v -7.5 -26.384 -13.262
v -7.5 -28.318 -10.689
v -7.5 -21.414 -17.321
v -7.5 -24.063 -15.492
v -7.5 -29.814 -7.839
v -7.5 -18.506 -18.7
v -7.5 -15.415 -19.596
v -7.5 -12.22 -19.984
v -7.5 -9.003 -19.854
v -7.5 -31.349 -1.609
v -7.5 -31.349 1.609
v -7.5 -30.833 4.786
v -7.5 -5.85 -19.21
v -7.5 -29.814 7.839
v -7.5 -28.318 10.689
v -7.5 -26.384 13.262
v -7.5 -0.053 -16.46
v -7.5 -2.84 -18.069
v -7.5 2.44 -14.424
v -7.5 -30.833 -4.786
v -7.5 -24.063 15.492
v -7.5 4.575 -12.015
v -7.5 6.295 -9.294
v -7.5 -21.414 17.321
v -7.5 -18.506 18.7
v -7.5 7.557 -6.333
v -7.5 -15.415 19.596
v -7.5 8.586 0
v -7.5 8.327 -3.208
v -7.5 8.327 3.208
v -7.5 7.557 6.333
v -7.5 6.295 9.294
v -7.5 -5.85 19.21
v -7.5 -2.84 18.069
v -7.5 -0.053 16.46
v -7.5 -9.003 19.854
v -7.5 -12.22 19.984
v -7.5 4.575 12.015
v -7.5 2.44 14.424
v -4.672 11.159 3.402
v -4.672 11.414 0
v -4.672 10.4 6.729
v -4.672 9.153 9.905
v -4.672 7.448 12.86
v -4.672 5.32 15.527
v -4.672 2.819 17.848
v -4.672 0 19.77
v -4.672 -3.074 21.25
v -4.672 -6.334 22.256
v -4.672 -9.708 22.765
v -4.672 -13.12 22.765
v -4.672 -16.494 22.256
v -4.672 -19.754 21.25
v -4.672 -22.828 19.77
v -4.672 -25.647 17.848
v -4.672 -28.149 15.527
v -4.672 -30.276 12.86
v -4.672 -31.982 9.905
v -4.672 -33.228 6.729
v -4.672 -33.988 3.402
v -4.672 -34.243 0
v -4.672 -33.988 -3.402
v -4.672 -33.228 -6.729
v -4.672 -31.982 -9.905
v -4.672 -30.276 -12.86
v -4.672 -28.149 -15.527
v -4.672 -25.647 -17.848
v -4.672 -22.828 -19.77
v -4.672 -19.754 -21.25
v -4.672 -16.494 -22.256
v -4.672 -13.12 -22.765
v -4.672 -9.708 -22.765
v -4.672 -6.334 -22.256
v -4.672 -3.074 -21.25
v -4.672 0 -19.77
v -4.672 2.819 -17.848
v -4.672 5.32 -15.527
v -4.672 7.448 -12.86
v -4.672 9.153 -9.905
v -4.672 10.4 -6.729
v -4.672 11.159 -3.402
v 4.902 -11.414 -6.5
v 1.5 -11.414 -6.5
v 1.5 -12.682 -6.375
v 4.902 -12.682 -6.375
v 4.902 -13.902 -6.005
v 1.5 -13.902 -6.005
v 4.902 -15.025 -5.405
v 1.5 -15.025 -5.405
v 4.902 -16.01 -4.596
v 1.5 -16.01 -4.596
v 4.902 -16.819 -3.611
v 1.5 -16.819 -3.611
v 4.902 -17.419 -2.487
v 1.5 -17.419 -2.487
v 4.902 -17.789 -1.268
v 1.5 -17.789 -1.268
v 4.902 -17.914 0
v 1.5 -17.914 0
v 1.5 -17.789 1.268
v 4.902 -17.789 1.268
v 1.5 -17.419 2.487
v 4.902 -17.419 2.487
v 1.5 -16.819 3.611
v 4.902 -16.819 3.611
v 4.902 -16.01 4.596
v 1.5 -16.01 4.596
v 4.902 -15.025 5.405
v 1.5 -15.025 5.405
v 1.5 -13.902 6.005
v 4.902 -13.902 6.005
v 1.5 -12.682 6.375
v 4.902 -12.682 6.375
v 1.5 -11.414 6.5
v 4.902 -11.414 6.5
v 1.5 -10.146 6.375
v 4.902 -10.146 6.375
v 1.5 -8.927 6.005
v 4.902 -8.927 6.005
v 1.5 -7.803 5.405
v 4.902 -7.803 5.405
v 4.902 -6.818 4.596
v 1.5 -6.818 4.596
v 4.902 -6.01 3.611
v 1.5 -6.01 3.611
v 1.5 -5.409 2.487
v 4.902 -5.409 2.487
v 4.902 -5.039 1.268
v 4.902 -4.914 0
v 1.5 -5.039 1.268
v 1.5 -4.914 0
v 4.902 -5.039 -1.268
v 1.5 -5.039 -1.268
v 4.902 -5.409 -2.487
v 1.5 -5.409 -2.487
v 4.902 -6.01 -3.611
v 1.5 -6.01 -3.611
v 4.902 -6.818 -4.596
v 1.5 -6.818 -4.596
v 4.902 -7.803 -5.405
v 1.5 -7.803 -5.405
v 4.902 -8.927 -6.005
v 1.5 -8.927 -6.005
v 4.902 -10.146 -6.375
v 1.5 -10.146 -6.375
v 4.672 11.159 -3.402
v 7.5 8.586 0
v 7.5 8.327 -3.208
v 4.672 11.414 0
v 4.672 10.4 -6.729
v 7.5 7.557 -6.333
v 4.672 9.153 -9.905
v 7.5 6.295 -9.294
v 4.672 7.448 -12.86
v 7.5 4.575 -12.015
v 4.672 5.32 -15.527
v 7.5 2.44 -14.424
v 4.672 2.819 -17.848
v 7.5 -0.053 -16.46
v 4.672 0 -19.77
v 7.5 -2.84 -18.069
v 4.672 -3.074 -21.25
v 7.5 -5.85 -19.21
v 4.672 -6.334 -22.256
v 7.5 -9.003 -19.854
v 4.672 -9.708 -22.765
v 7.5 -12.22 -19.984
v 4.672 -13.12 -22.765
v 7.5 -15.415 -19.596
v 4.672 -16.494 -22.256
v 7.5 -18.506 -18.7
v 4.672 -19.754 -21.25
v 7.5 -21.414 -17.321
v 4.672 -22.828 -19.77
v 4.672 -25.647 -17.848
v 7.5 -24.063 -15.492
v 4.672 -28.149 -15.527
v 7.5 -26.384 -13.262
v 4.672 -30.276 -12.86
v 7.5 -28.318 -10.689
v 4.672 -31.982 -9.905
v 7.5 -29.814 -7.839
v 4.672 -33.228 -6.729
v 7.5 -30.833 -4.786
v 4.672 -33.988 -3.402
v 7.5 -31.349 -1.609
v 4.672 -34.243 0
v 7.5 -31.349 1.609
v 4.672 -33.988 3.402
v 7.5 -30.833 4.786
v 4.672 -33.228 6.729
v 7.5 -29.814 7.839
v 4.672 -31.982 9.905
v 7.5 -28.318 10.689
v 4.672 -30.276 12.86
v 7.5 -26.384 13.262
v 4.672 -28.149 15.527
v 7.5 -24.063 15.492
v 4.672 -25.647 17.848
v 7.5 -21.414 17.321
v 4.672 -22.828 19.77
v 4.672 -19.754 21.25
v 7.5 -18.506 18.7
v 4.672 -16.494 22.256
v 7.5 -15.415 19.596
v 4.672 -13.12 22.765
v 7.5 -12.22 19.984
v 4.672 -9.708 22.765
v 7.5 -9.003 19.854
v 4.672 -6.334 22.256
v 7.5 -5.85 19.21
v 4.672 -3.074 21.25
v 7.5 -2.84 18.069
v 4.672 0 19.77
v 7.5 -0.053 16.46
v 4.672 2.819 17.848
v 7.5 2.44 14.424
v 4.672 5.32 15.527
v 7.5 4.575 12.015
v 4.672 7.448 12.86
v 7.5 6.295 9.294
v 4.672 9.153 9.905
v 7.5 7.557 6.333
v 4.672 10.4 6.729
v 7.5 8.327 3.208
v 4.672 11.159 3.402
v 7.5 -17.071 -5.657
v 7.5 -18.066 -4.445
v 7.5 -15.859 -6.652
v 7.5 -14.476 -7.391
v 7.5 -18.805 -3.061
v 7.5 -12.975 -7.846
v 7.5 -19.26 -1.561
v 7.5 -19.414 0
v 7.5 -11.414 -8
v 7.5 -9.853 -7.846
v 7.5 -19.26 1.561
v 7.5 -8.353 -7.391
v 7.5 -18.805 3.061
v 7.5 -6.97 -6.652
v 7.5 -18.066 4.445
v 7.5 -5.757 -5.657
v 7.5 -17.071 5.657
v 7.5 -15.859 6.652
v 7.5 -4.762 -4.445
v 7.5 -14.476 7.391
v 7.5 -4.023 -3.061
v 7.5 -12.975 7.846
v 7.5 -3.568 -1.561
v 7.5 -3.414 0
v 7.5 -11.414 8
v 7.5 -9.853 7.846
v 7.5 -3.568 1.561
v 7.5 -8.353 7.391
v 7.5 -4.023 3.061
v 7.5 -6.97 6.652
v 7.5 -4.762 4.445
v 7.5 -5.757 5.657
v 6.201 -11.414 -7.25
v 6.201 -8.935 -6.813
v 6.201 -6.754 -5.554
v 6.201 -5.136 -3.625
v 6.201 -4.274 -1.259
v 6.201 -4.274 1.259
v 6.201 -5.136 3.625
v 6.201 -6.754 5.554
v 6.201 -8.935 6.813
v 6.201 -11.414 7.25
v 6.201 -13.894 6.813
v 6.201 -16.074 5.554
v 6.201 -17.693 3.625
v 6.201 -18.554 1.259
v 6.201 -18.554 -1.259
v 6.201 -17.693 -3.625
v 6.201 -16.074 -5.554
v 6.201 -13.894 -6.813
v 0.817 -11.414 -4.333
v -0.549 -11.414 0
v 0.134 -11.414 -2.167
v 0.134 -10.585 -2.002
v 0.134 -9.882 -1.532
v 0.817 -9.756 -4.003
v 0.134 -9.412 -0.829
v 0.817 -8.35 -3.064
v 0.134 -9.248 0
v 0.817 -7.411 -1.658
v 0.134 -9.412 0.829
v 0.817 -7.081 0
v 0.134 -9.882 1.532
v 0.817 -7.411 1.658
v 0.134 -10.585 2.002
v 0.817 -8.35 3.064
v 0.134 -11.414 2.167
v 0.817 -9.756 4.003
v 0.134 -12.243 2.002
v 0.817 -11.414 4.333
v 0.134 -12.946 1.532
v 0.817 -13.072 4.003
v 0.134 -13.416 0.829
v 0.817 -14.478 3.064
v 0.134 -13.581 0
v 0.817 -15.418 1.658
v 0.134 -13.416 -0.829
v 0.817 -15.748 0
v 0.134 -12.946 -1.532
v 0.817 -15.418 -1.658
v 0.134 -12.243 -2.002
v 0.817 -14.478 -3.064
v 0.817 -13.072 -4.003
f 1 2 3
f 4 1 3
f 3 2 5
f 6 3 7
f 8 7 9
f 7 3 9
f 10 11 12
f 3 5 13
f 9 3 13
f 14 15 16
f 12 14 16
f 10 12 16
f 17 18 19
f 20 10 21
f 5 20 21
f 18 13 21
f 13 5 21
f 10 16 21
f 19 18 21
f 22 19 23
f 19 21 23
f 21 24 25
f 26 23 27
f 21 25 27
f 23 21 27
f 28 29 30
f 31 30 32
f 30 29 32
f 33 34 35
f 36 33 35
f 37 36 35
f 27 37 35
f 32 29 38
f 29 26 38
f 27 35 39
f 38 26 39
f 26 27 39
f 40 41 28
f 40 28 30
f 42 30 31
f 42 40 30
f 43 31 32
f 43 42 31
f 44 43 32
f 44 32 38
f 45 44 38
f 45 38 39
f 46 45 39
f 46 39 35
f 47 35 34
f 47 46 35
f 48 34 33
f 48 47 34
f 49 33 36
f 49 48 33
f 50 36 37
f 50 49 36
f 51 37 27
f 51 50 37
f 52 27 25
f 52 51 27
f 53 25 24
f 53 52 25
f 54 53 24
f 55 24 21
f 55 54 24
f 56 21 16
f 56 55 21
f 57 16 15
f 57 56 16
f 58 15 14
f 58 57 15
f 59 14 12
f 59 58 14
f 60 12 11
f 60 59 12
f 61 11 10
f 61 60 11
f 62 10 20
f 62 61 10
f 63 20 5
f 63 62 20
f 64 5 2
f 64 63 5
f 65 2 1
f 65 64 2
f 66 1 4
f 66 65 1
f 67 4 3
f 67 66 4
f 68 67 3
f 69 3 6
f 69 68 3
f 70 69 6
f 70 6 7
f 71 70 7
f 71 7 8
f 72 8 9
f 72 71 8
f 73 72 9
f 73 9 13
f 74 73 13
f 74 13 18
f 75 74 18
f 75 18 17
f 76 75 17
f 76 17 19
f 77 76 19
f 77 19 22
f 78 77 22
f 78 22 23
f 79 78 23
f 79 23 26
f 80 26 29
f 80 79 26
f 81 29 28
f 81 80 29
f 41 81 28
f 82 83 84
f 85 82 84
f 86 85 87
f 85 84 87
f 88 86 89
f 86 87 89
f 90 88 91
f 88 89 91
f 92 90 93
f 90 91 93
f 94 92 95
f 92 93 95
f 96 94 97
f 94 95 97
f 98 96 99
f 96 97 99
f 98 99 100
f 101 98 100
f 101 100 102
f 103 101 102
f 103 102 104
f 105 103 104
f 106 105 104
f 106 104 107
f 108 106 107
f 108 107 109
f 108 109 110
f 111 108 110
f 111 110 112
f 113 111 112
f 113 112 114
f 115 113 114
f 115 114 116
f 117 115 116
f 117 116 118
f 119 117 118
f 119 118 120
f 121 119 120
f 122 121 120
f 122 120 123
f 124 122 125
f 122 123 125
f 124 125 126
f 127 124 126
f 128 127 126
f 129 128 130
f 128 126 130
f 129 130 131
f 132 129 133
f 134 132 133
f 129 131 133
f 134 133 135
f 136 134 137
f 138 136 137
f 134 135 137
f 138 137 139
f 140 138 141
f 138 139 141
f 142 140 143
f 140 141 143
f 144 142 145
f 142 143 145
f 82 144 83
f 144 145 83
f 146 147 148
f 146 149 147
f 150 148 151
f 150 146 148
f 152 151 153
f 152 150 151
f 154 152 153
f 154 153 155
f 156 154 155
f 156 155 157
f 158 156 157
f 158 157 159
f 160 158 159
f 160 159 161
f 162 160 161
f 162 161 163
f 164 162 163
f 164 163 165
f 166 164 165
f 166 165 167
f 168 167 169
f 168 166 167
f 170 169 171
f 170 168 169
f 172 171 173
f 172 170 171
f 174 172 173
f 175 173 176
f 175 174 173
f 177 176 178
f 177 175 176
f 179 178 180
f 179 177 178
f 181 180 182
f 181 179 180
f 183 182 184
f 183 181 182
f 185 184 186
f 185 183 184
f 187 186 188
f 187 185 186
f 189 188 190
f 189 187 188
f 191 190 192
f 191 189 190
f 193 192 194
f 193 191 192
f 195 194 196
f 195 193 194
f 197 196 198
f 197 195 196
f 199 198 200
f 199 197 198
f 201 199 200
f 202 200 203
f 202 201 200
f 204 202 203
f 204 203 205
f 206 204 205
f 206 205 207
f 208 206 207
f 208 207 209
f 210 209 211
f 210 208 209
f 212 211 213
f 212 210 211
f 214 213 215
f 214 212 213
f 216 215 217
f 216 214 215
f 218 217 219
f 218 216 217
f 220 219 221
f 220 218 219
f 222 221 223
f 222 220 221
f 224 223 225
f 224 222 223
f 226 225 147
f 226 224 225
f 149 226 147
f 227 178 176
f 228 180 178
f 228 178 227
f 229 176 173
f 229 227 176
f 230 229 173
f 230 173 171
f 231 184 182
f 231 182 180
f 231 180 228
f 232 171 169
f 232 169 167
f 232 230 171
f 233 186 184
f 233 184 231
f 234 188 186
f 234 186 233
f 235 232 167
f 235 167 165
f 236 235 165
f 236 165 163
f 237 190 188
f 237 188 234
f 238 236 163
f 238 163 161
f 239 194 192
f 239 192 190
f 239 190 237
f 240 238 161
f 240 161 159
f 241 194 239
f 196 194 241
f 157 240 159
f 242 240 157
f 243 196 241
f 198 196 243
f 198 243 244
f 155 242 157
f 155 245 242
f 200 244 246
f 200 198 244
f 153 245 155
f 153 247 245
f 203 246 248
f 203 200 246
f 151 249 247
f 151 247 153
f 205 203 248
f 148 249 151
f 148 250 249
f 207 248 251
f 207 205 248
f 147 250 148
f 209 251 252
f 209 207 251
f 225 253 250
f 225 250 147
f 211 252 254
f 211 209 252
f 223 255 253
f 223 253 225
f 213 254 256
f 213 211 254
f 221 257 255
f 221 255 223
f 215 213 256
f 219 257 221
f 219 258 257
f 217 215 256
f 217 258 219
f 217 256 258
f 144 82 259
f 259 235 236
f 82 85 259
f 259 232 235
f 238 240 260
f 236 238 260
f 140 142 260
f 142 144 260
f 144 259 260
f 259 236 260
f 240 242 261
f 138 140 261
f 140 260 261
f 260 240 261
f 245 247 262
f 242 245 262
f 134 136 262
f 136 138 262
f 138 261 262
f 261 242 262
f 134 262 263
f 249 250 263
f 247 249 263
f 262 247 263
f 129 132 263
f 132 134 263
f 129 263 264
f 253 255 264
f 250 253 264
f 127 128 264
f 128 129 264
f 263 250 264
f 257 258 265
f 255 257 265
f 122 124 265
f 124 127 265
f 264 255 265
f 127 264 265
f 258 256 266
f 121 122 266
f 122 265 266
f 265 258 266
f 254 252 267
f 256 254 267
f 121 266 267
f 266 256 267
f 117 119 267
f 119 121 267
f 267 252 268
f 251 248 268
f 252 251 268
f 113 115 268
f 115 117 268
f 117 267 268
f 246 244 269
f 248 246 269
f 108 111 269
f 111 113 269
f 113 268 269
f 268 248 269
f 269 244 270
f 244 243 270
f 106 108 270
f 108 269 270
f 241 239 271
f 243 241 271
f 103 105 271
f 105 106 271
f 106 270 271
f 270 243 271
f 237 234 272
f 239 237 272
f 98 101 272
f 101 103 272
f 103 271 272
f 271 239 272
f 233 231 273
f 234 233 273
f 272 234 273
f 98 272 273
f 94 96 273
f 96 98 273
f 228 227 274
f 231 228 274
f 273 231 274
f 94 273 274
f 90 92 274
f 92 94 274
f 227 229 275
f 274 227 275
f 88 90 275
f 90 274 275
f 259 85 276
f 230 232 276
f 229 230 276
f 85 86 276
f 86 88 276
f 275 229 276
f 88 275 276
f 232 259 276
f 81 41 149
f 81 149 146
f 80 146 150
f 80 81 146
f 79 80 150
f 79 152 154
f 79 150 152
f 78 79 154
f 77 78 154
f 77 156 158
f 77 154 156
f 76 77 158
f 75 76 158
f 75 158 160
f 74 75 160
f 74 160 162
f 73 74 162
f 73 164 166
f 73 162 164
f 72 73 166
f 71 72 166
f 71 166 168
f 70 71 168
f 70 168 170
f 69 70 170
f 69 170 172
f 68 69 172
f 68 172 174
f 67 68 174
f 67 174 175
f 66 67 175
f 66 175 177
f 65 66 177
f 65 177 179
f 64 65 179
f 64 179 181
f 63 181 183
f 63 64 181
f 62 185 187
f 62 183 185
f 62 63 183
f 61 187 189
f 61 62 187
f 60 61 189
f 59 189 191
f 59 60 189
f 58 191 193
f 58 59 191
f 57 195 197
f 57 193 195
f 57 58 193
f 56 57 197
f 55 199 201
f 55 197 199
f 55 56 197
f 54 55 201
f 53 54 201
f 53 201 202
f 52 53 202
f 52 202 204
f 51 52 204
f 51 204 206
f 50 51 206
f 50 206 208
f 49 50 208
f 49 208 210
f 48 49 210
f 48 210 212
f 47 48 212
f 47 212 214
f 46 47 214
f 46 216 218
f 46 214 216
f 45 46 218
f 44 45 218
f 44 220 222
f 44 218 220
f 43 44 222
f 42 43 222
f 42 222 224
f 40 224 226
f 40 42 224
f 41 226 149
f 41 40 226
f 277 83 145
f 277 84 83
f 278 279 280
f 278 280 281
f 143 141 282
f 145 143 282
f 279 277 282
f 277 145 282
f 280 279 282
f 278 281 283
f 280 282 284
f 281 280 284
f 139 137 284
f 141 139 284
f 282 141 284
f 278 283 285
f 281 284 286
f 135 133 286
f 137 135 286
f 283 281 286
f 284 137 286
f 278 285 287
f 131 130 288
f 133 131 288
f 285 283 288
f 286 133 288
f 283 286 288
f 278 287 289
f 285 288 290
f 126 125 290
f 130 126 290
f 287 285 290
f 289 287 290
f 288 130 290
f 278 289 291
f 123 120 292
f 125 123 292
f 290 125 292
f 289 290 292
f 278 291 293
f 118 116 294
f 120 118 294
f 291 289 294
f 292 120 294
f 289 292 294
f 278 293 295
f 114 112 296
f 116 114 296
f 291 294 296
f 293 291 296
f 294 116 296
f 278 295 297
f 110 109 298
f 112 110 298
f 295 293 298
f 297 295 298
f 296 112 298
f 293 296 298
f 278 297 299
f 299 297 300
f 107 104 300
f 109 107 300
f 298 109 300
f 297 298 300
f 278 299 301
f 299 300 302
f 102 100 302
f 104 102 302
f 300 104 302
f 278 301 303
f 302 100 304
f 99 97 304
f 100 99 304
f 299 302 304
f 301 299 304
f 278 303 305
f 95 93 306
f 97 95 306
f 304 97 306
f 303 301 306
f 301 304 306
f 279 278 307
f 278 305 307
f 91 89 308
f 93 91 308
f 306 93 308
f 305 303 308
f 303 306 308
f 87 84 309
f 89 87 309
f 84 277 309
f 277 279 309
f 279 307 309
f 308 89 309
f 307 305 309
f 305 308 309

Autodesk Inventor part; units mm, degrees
ref_plane "YZ Plane" through (0, 0, 0) normal (1, 0, 0) x (0, 1, 0)
ref_plane "XZ Plane" through (0, 0, 0) normal (0, 1, 0) x (-1, 0, 0)
ref_plane "XY Plane" through (0, 0, 0) normal (0, 0, 1) x (1, 0, 0)
sketch "Эскиз1" plane through (-7.5, -11.4142, 0) normal (0, 0, 1) x (1, 0, 0)
  line L0 (0, 0) -> (0, 20)
  line L1 (0, 20) -> (2.8284, 22.8284)
  line L2 (0, 0) -> (15, 0)
  line L3 (15, 0) -> (15, 20)
  line L4 (15, 20) -> (12.1716, 22.8284)
  line L5 (12.1716, 22.8284) -> (2.8284, 22.8284)
  dimension "d5" = 20
  dimension "d4" = 4
  dimension "d3" = 135
  dimension "d2" = 15
  dimension "d1" = 4
  dimension "d0" = 135
revolve "Вращение1" add sketch "Эскиз1" angle 360 about axis through (-7.5, -11.4142, 0) along (1, 0, 0)
sketch "Эскиз2" plane through (7.5, -11.4142, 0) normal (1, 0, 0) x (0, 0, -1)
  circle A0 centre (0, 0) radius 20 construction
  point P0 (0, 11.4142)
hole "Отверстие1" at (7.5, -11.4142, 0) direction (-1, 0, 0) diameter 13 depth 6 tip angle 145 countersink diameter 16 countersink angle 60
properties part number "711131"
